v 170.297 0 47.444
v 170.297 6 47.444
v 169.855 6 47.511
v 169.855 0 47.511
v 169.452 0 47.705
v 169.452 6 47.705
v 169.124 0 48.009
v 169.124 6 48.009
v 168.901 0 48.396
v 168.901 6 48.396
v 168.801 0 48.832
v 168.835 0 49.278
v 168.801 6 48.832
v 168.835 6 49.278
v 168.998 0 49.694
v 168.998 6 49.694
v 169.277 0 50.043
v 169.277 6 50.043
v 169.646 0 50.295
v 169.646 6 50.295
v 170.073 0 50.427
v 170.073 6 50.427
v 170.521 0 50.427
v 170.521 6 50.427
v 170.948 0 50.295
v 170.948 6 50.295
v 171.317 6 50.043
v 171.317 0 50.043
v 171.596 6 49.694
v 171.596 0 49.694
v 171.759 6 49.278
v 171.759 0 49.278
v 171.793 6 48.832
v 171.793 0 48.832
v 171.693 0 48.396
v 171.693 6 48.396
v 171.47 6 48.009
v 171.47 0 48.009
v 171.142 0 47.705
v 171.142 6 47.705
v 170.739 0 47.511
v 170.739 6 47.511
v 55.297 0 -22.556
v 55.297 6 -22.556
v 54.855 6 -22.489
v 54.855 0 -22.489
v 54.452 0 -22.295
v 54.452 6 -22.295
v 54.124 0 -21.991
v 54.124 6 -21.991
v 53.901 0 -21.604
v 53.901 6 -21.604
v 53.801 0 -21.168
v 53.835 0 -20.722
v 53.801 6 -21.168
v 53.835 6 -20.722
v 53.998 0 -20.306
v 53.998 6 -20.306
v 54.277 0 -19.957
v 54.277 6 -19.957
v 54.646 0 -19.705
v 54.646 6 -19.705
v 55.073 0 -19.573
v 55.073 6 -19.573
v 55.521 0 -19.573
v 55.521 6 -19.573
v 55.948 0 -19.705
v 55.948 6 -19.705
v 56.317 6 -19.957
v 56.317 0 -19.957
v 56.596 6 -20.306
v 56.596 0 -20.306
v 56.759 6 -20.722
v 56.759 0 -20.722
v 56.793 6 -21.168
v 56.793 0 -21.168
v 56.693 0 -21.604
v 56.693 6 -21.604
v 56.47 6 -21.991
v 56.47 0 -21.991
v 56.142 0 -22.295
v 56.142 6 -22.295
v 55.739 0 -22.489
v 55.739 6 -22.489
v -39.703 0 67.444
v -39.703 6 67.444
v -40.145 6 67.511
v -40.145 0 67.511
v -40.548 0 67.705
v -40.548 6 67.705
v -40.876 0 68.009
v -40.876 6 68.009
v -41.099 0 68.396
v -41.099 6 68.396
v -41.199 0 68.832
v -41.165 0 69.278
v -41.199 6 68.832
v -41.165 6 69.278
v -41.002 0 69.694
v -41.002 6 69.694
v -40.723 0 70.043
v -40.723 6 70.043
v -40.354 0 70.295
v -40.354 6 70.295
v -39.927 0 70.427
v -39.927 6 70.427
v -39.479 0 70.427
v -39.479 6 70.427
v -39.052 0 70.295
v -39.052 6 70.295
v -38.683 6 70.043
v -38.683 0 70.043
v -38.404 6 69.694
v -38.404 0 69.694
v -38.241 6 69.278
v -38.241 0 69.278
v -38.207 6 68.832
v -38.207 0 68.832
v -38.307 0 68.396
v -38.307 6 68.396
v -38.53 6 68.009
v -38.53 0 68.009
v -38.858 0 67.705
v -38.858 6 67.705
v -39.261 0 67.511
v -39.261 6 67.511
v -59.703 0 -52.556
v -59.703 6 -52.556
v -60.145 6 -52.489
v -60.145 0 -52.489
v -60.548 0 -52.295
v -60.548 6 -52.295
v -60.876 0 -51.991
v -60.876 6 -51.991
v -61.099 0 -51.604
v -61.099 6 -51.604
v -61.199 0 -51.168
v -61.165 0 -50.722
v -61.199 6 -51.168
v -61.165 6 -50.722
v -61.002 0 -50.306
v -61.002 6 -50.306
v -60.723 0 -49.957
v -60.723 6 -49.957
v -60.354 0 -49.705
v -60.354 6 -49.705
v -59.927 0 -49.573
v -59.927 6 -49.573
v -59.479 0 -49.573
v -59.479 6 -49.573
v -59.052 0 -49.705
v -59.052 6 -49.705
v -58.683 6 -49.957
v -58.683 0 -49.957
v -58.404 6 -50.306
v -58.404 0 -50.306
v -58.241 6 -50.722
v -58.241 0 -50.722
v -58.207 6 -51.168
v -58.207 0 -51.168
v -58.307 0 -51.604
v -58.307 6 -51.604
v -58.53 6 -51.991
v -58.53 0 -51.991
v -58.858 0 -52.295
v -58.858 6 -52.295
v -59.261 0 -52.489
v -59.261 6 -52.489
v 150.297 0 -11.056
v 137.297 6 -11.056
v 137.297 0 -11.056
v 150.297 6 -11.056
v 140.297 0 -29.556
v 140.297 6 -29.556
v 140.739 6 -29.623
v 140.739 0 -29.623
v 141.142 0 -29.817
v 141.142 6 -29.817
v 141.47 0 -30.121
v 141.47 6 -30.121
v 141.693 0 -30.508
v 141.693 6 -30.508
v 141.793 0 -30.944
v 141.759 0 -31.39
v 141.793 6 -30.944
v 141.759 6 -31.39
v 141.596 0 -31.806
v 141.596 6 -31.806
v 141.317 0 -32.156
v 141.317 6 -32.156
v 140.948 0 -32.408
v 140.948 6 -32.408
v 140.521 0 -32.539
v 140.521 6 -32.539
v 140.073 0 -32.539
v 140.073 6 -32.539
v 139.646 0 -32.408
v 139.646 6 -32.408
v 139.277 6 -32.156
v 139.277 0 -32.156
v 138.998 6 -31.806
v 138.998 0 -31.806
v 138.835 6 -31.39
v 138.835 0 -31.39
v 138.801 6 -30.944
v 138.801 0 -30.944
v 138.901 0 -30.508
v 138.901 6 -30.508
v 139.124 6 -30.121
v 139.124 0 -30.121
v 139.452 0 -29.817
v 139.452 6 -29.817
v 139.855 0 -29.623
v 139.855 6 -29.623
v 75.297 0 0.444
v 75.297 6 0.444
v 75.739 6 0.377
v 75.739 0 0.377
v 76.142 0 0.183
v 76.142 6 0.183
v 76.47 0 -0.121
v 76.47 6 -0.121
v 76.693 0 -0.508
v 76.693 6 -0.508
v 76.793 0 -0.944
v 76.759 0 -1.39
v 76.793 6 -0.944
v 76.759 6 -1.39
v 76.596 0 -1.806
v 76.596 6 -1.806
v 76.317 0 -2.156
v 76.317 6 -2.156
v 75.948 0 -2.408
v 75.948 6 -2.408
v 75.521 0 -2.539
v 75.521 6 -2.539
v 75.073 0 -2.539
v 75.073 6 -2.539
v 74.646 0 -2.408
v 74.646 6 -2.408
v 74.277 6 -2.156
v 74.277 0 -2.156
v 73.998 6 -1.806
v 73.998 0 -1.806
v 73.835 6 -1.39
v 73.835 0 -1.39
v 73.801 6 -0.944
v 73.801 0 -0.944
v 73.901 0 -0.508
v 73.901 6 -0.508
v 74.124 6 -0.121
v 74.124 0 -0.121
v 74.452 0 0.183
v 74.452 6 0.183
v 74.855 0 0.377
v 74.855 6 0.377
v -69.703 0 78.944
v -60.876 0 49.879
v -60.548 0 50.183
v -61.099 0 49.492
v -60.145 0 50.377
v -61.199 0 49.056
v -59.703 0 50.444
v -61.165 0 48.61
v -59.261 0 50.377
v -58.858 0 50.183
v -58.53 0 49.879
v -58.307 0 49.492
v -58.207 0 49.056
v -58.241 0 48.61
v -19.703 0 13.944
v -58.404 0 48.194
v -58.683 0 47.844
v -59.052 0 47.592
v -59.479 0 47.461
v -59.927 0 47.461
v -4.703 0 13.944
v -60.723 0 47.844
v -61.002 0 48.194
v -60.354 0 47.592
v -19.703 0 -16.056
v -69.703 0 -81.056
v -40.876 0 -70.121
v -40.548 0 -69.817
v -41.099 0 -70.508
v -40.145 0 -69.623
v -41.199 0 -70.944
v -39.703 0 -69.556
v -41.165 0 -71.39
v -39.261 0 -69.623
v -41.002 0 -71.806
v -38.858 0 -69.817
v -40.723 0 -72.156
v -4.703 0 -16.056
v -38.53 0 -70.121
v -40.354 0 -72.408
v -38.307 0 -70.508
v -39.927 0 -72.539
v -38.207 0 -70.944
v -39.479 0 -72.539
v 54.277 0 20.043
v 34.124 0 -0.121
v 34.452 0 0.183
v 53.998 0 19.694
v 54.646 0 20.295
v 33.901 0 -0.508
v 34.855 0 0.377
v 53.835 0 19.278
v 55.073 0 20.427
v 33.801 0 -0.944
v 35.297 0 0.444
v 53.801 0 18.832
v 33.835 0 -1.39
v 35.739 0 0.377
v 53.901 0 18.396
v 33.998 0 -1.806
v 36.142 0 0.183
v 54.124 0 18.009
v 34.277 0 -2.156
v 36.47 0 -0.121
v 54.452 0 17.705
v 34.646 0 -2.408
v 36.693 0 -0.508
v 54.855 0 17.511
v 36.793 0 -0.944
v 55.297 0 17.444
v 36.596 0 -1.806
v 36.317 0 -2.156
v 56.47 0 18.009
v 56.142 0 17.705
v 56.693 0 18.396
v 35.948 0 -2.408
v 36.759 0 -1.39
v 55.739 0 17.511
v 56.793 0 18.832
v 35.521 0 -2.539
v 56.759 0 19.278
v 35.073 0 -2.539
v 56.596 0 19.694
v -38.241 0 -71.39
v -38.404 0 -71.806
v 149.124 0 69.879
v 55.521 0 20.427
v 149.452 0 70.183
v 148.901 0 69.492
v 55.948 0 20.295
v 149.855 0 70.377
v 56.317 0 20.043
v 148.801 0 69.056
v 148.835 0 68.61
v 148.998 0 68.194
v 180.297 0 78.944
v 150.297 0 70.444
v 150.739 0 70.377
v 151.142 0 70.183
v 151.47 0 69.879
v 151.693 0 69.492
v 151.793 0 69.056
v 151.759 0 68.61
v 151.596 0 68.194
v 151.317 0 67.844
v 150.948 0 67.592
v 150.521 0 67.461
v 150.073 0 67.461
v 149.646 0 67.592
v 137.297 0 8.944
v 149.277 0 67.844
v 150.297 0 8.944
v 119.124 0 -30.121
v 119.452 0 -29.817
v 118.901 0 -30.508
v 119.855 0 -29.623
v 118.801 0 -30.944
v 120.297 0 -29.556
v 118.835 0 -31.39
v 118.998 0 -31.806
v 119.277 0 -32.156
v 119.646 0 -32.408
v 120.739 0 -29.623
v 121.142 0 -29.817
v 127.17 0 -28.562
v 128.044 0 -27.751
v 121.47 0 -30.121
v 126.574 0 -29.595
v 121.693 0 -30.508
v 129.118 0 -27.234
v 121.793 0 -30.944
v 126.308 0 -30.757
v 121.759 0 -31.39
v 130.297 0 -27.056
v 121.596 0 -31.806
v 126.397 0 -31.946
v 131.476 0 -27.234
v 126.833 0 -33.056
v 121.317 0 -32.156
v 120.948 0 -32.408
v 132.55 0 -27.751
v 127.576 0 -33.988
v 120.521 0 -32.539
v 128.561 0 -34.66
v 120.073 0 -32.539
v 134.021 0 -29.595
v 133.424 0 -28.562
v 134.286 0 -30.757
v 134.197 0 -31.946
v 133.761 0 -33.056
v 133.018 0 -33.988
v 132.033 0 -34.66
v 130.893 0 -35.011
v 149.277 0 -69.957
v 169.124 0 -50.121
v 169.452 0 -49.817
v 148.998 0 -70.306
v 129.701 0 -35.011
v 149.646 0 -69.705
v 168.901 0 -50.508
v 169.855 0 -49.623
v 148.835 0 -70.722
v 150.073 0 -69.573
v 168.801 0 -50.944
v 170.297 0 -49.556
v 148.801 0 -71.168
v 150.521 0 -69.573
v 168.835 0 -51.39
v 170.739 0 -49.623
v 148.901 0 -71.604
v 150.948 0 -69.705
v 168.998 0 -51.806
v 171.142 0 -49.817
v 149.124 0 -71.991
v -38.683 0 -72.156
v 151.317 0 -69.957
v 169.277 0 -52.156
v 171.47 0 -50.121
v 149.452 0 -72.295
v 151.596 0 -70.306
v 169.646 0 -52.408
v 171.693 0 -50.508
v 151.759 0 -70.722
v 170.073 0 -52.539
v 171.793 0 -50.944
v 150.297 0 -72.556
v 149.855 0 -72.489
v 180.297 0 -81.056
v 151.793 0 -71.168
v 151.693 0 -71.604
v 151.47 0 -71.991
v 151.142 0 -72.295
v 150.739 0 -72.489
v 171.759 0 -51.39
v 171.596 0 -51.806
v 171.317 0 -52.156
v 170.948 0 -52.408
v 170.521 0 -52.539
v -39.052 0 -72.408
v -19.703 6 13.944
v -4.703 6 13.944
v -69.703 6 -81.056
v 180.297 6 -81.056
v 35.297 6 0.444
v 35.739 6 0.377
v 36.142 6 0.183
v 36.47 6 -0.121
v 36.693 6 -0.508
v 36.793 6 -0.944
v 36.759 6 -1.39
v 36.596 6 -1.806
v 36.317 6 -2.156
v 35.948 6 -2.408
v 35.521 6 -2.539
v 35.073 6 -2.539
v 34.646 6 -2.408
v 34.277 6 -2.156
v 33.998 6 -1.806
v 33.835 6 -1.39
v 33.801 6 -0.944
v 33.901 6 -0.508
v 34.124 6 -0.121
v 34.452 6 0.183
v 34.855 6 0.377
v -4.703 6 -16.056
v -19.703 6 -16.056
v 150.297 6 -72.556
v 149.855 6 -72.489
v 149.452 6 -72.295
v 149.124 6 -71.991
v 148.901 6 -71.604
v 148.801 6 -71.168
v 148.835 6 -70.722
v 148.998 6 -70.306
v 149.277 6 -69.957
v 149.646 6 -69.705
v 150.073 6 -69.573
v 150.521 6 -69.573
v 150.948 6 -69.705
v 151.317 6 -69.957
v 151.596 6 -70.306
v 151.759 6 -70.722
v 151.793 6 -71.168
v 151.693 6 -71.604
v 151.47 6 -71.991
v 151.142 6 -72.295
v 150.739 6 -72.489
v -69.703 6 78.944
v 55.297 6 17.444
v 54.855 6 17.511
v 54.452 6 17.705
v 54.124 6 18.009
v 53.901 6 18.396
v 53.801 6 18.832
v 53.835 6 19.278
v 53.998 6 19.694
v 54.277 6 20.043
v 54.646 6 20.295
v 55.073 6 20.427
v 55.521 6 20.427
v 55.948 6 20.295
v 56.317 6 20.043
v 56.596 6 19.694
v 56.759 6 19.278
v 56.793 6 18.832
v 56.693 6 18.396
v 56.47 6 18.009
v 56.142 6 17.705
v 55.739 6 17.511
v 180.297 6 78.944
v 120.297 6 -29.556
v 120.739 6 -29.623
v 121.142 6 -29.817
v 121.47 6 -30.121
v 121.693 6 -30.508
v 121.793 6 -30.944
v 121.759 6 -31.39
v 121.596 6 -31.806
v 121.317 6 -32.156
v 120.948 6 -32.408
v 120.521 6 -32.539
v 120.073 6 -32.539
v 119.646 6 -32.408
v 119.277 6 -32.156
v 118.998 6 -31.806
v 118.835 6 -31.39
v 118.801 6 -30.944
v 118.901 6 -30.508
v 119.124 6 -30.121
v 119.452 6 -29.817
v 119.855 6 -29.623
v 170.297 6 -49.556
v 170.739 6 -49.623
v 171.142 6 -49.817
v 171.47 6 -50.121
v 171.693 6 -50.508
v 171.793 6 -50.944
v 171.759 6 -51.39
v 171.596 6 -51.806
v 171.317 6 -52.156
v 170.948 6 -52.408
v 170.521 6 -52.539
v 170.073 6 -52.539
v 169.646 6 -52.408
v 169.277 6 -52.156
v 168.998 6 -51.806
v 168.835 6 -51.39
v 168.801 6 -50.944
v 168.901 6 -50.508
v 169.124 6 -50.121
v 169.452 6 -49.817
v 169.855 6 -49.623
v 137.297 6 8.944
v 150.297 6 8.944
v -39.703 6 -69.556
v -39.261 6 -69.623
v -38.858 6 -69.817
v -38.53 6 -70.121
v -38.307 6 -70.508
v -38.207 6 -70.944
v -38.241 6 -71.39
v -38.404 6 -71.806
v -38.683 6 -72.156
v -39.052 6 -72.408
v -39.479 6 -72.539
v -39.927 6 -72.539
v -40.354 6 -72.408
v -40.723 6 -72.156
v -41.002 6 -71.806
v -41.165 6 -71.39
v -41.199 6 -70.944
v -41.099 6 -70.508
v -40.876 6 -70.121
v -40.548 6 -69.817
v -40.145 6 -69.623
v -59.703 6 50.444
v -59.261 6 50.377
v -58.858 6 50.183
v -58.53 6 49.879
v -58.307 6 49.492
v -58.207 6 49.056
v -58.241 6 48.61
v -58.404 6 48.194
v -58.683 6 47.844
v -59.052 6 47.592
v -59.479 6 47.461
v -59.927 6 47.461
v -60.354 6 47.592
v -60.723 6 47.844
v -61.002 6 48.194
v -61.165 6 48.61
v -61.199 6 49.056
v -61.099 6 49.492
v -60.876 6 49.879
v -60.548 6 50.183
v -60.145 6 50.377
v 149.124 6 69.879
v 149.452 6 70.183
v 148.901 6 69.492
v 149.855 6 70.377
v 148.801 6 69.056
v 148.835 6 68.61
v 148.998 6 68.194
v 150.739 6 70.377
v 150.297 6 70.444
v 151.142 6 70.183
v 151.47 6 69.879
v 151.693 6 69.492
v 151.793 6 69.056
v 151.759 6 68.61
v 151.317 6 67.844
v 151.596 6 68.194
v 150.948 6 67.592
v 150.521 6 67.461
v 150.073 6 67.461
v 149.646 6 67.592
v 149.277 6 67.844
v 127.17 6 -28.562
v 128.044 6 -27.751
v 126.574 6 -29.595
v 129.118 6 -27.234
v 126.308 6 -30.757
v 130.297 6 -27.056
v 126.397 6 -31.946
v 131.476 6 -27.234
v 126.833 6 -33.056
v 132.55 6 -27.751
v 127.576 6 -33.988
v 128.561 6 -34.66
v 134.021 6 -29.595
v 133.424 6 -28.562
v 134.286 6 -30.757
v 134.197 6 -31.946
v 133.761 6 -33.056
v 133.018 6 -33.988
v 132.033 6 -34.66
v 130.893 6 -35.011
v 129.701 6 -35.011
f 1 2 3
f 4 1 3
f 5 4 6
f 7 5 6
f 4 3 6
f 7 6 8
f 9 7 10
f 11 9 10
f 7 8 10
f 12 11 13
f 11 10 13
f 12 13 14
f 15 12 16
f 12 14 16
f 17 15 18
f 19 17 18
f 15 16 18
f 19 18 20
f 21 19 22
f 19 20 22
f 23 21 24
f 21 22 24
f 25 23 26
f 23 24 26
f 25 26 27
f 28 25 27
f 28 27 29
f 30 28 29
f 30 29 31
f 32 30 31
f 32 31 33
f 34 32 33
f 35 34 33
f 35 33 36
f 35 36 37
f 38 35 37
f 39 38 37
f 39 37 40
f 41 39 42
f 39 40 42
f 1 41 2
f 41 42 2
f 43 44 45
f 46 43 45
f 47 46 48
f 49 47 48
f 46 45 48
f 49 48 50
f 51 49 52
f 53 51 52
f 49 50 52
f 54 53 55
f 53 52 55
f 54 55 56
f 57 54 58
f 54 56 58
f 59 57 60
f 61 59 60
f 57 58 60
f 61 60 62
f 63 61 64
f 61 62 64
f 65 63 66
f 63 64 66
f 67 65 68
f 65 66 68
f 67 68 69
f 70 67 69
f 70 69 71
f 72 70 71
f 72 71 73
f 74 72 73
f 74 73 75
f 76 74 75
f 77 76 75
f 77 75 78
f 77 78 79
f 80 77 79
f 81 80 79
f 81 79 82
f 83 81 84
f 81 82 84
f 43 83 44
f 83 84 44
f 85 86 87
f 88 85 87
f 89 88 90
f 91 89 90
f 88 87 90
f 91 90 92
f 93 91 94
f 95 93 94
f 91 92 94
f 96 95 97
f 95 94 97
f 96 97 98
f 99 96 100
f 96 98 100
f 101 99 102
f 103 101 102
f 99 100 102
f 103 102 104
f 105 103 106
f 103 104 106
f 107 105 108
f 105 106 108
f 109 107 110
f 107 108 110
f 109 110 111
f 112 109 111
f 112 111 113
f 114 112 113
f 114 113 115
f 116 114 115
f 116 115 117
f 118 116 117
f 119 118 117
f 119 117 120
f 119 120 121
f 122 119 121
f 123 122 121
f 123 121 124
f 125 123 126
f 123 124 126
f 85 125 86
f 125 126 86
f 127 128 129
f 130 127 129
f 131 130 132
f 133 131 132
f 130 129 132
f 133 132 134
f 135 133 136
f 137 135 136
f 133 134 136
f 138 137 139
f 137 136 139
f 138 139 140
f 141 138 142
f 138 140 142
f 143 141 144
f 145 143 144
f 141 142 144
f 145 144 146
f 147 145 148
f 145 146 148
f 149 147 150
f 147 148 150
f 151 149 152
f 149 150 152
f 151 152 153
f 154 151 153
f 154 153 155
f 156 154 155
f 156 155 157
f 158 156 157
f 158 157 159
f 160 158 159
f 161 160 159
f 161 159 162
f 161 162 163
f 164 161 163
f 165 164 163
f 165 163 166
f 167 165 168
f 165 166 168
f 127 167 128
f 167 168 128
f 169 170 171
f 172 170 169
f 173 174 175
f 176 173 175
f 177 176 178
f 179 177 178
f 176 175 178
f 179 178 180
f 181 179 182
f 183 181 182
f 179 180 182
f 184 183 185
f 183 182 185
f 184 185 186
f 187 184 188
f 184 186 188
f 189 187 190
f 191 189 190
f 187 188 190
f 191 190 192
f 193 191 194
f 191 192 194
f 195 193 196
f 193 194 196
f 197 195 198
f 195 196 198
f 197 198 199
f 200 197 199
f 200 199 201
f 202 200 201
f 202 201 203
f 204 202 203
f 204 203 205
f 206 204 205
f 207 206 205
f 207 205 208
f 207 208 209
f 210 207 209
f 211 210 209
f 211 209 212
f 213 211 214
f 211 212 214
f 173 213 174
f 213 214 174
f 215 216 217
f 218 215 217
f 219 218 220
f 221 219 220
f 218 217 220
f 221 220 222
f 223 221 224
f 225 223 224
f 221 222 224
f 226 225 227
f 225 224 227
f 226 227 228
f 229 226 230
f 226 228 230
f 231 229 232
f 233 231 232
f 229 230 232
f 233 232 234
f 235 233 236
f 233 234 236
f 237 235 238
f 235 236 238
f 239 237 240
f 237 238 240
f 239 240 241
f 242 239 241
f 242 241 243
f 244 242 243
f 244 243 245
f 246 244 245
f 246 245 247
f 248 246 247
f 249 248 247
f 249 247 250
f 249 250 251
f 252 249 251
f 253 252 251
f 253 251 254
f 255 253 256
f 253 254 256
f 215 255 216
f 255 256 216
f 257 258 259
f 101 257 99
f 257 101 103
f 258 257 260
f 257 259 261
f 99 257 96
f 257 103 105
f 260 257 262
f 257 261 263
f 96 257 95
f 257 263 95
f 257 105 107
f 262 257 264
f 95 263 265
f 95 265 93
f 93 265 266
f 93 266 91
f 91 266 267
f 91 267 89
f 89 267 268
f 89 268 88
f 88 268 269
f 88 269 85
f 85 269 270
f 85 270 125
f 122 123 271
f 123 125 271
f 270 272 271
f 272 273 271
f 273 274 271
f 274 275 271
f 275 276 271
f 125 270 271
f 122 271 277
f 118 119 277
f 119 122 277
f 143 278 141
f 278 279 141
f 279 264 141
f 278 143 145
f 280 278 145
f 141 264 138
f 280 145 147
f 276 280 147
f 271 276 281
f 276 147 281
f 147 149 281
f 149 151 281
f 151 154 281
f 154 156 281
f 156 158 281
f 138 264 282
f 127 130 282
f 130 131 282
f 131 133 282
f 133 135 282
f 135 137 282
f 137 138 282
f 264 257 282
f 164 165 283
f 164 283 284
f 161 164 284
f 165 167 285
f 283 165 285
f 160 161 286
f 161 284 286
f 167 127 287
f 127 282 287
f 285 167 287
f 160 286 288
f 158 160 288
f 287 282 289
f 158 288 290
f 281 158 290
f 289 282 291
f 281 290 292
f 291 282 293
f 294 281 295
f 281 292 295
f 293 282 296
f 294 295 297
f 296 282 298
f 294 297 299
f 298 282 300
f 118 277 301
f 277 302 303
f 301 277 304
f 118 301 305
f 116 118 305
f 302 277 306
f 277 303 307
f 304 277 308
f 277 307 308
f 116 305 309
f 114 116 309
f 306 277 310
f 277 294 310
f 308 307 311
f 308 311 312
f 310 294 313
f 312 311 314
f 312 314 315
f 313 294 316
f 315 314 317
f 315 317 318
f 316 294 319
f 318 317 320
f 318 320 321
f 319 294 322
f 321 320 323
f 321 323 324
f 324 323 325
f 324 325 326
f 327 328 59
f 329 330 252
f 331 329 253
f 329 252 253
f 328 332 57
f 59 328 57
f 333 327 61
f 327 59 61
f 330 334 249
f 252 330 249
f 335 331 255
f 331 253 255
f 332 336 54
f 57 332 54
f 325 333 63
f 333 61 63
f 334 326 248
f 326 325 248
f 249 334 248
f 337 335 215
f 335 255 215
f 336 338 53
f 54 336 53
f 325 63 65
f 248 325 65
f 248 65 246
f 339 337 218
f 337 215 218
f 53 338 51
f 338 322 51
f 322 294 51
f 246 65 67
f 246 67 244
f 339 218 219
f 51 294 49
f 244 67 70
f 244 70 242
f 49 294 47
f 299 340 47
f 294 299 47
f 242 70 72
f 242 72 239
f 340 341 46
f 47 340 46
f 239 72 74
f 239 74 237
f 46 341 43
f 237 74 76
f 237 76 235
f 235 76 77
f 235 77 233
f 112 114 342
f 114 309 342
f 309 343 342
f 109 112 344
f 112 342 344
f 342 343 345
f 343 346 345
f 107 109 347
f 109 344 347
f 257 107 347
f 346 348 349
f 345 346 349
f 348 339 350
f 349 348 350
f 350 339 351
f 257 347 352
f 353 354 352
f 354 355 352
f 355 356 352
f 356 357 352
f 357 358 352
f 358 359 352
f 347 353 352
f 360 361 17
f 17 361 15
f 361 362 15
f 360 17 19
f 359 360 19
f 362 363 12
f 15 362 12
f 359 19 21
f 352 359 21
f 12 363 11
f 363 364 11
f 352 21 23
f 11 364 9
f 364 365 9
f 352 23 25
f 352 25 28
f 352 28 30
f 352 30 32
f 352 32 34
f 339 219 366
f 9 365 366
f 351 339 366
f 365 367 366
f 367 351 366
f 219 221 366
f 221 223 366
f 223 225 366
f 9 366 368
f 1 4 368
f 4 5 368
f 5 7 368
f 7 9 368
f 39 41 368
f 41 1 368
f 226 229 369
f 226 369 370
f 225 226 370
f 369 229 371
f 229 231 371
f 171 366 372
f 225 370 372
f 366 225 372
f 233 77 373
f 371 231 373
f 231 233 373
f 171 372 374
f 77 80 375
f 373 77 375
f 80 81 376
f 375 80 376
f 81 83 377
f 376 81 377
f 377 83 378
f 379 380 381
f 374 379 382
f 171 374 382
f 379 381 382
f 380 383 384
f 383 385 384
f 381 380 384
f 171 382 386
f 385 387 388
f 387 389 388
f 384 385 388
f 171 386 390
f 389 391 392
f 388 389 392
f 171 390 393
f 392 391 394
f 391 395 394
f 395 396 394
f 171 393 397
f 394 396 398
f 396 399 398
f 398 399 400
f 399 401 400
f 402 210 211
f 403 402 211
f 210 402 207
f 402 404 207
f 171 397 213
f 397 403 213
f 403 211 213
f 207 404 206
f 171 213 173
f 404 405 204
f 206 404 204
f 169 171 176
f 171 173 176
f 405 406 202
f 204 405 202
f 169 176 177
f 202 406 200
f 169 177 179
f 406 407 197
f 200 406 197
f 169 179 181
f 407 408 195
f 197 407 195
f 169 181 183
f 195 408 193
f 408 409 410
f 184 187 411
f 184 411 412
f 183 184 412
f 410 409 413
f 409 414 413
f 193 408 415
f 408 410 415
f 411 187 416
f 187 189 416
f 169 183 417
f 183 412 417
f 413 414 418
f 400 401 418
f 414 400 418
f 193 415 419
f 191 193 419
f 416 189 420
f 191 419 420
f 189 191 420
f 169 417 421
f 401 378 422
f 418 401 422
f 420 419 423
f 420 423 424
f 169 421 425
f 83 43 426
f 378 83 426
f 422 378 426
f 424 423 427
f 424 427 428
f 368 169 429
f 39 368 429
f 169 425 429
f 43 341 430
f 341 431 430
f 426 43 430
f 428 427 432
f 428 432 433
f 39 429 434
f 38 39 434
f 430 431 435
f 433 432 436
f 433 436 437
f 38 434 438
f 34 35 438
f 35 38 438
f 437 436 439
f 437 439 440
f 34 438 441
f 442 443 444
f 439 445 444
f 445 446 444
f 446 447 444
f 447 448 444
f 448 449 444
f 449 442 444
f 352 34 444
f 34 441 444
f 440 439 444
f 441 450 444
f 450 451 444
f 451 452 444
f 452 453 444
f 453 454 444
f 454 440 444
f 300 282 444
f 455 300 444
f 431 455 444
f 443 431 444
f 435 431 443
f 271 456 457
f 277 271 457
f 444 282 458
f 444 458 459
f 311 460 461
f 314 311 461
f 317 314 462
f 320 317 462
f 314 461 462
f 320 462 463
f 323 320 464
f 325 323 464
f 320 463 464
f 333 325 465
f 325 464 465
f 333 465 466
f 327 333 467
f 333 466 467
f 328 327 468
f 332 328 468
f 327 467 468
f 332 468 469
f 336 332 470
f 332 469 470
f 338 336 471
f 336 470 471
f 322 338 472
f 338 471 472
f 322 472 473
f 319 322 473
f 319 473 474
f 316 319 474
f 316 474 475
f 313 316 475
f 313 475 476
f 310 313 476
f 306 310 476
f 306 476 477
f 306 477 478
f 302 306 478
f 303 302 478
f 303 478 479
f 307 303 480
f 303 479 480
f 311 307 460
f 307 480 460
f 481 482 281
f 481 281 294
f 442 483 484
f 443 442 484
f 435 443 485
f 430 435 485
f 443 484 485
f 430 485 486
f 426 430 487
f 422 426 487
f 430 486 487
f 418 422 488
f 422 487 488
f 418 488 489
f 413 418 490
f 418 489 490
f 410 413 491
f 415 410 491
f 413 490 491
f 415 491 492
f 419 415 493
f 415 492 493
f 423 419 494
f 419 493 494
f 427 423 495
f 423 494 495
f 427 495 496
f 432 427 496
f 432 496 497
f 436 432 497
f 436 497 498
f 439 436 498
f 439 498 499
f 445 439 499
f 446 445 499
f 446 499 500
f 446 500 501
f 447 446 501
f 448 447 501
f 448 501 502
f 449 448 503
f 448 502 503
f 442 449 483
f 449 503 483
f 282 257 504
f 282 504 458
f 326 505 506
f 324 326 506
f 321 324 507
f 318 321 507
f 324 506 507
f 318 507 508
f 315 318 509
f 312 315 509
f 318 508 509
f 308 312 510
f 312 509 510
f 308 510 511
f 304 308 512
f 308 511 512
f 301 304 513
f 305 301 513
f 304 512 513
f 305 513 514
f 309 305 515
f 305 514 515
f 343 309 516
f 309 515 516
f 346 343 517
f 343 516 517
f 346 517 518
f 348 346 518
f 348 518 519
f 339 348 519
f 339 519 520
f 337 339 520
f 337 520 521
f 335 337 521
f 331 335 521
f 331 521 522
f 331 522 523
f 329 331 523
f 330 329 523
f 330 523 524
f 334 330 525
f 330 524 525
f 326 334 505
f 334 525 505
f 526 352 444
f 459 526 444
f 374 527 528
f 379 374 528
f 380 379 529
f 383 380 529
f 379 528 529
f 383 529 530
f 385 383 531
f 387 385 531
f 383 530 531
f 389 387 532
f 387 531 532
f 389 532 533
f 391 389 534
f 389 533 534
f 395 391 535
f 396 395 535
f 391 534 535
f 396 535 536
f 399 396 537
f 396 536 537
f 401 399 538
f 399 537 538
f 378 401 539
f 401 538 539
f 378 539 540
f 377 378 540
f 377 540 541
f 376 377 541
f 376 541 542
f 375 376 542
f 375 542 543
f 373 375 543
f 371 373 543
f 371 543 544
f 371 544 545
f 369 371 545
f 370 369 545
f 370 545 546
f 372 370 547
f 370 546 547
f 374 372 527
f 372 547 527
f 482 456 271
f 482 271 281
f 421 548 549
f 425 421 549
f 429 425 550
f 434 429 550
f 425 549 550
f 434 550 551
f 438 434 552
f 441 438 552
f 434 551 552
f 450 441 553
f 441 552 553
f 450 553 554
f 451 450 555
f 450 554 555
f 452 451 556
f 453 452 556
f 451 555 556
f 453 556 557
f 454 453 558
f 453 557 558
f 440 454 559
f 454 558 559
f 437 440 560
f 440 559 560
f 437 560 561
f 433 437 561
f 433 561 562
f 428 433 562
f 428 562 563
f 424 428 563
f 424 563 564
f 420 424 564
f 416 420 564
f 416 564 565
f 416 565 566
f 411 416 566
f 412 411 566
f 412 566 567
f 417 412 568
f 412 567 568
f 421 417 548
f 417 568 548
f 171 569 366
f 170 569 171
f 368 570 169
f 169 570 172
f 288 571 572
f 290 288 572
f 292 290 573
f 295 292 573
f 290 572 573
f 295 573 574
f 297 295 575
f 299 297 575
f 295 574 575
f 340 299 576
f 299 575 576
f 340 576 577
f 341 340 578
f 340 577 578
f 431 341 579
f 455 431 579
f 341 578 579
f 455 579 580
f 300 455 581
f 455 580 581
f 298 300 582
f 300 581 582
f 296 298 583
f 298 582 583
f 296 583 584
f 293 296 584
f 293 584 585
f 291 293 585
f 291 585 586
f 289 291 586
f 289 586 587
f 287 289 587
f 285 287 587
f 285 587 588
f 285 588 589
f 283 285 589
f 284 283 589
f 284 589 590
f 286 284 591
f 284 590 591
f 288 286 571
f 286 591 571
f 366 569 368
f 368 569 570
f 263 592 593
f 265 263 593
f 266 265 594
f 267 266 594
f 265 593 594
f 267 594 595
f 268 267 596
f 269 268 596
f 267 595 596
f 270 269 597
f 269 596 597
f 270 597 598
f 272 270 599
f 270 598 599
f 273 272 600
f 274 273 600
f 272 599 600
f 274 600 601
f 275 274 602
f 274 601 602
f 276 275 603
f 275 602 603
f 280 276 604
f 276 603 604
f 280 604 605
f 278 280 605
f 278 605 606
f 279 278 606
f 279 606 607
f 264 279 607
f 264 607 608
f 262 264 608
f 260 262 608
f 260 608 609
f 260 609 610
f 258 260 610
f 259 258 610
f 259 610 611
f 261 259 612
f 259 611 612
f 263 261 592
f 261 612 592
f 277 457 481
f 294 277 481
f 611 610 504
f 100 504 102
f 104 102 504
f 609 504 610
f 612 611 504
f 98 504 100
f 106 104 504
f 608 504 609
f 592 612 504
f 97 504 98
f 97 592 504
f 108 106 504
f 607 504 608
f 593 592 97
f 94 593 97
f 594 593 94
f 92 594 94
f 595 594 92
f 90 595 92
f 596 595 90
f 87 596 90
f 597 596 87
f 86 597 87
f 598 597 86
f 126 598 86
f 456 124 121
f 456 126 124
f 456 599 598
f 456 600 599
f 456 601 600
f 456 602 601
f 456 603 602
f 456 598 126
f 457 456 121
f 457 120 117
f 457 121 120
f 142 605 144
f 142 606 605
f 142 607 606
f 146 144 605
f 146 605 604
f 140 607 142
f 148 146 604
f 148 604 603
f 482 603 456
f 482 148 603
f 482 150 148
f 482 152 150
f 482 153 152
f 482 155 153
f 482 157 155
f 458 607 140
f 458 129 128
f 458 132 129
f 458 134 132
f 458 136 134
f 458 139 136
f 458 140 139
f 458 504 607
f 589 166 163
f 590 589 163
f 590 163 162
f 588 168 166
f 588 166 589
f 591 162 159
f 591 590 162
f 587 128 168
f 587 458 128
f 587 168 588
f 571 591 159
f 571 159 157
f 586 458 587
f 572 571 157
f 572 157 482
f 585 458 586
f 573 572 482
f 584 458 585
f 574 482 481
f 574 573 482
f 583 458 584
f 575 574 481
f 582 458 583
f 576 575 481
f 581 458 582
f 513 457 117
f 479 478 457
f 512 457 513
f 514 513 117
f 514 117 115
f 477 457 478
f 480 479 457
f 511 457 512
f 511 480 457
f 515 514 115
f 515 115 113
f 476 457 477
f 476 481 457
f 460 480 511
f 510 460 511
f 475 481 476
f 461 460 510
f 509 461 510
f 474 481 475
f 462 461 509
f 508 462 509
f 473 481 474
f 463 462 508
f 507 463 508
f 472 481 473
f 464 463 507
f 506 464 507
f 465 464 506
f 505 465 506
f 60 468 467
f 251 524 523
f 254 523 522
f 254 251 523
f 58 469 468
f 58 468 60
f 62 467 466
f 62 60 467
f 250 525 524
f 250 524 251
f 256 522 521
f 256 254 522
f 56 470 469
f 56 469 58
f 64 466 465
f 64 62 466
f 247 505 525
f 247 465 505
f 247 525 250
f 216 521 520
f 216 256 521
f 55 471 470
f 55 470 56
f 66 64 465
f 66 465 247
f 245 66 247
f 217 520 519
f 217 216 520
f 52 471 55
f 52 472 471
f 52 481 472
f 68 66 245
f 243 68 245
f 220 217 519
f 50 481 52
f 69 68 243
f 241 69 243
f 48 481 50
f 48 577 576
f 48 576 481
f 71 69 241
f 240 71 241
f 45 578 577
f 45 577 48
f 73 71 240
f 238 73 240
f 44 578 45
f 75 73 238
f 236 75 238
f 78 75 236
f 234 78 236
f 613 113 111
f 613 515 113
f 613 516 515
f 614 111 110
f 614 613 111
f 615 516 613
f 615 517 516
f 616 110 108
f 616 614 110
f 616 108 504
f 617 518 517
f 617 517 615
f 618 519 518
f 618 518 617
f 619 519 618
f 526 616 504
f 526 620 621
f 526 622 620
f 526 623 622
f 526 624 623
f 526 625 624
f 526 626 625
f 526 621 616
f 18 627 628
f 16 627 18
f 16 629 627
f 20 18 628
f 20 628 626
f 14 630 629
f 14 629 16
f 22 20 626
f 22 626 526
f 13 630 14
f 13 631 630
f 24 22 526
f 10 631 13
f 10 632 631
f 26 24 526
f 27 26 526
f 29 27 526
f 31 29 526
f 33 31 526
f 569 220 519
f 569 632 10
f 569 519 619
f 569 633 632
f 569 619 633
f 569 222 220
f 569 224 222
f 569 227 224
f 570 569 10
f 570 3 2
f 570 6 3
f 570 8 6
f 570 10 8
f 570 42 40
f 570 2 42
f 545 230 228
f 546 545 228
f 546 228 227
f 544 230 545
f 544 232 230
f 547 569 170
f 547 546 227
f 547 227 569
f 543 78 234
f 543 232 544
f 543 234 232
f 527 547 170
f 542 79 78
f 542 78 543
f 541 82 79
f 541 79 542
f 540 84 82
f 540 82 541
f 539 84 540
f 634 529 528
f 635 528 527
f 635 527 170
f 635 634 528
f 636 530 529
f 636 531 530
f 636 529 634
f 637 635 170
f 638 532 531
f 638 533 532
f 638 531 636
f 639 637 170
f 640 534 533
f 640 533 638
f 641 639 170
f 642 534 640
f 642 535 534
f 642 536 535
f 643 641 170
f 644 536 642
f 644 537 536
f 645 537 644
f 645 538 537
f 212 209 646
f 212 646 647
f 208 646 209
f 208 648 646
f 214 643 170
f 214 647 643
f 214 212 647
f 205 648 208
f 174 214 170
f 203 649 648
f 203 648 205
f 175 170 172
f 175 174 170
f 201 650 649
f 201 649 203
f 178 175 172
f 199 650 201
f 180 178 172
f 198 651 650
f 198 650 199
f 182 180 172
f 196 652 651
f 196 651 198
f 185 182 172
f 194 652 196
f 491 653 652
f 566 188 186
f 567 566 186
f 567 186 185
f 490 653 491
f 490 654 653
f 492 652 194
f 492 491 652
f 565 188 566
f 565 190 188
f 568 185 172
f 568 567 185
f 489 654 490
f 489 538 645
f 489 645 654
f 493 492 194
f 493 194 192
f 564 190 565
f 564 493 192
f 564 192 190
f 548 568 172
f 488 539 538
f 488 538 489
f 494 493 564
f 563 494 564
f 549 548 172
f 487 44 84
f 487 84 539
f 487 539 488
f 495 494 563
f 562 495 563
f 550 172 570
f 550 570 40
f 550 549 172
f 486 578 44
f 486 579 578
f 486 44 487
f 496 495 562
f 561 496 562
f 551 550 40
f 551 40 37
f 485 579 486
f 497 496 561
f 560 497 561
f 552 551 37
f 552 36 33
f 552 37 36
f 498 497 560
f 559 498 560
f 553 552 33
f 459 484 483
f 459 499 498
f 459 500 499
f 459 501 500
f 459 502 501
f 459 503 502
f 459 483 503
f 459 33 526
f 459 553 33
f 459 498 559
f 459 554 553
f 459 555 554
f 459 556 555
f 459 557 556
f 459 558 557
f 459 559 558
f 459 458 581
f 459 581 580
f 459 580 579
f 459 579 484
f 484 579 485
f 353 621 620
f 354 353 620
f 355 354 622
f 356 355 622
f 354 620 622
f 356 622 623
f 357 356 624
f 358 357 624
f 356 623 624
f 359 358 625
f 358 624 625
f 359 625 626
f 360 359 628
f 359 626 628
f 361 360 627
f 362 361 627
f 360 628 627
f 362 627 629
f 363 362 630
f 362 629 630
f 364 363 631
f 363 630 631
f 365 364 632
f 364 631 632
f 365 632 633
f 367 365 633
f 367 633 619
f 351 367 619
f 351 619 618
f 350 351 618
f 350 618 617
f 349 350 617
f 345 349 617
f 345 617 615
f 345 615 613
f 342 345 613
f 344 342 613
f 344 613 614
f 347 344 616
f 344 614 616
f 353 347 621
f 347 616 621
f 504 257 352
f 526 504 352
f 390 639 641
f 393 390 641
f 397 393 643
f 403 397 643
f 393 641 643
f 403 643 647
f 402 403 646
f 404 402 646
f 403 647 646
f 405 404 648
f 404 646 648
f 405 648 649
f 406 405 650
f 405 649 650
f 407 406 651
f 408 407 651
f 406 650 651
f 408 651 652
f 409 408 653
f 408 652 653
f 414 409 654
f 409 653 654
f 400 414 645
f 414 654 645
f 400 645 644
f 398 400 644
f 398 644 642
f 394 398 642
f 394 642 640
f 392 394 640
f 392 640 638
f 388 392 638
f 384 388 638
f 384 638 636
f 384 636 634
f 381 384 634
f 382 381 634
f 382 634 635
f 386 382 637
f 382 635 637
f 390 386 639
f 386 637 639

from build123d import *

# Parameters (mm, degrees)
SKETCH_1_W          = 250
SKETCH_1_H          = 160
EXTRUDE_1_DEPTH     = 6
SKETCH_2_R          = 1.5
CUT_EXTRUDE_1_DEPTH = 6
SKETCH_3_R          = 1.5
SKETCH_3_R_2        = 4
SKETCH_3_W          = 13
SKETCH_3_H          = 20
CUT_EXTRUDE_2_DEPTH = 6
SKETCH_4_W          = 15
SKETCH_4_H          = 30
CUT_EXTRUDE_3_DEPTH = 6


with BuildPart() as part:
    # Эскиз1 → Бобышка-Вытянуть1 (new body)
    with BuildSketch(Plane(origin=(0, 0, 0), x_dir=(1, 0, 0), z_dir=(0, 1, 0))):
        with Locations((55.297029703, 1.056105611)):
            Rectangle(SKETCH_1_W, SKETCH_1_H)
    extrude(amount=EXTRUDE_1_DEPTH)

    # Эскиз2 → Вырез-Вытянуть1 (cut)
    with BuildSketch(Plane(origin=(0, 6, 0), x_dir=(1, 0, 0), z_dir=(0, 1, 0))):
        with Locations(Location((-39.702970297, 71.056105611, 0), (0, 0, 270))):
            Circle(SKETCH_2_R)
        with Locations(Location((-59.702970297, 51.056105611, 0), (0, 0, 90))):
            Circle(SKETCH_2_R)
        with Locations(Location((150.297029703, 71.056105611, 0), (0, 0, 90))):
            Circle(SKETCH_2_R)
        with Locations(Location((170.297029703, 51.056105611, 0), (0, 0, 270))):
            Circle(SKETCH_2_R)
        with Locations(Location((170.297029703, -48.943894389, 0), (0, 0, 90))):
            Circle(SKETCH_2_R)
        with Locations(Location((150.297029703, -68.943894389, 0), (0, 0, 270))):
            Circle(SKETCH_2_R)
        with Locations(Location((-59.702970297, -48.943894389, 0), (0, 0, 270))):
            Circle(SKETCH_2_R)
        with Locations(Location((-39.702970297, -68.943894389, 0), (0, 0, 90))):
            Circle(SKETCH_2_R)
        with Locations(Location((35.297029703, 1.056105611, 0), (0, 0, 270))):
            Circle(SKETCH_2_R)
        with Locations(Location((55.297029703, 21.056105611, 0), (0, 0, 90))):
            Circle(SKETCH_2_R)
        with Locations(Location((55.297029703, -18.943894389, 0), (0, 0, 90))):
            Circle(SKETCH_2_R)
        with Locations(Location((75.297029703, 1.056105611, 0), (0, 0, 270))):
            Circle(SKETCH_2_R)
    extrude(amount=-CUT_EXTRUDE_1_DEPTH, mode=Mode.SUBTRACT)

    # Эскиз3 → Вырез-Вытянуть2 (cut)
    with BuildSketch(Plane(origin=(0, 6, 0), x_dir=(1, 0, 0), z_dir=(0, 1, 0))):
        with Locations(Location((140.297029703, 31.056105611, 0), (0, 0, 270))):
            Circle(SKETCH_3_R)
        with Locations(Location((120.297029703, 31.056105611, 0), (0, 0, 270))):
            Circle(SKETCH_3_R)
        with Locations(Location((130.297029703, 31.056105611, 0), (0, 0, 270))):
            Circle(SKETCH_3_R_2)
        with Locations((143.797029703, 1.056105611)):
            Rectangle(SKETCH_3_W, SKETCH_3_H)
    extrude(amount=-CUT_EXTRUDE_2_DEPTH, mode=Mode.SUBTRACT)

    # Эскиз4 → Вырез-Вытянуть3 (cut)
    with BuildSketch(Plane(origin=(0, 6, 0), x_dir=(1, 0, 0), z_dir=(0, 1, 0))):
        with Locations((-12.202970297, 1.056105611)):
            Rectangle(SKETCH_4_W, SKETCH_4_H)
    extrude(amount=-CUT_EXTRUDE_3_DEPTH, mode=Mode.SUBTRACT)


solid = part.part
